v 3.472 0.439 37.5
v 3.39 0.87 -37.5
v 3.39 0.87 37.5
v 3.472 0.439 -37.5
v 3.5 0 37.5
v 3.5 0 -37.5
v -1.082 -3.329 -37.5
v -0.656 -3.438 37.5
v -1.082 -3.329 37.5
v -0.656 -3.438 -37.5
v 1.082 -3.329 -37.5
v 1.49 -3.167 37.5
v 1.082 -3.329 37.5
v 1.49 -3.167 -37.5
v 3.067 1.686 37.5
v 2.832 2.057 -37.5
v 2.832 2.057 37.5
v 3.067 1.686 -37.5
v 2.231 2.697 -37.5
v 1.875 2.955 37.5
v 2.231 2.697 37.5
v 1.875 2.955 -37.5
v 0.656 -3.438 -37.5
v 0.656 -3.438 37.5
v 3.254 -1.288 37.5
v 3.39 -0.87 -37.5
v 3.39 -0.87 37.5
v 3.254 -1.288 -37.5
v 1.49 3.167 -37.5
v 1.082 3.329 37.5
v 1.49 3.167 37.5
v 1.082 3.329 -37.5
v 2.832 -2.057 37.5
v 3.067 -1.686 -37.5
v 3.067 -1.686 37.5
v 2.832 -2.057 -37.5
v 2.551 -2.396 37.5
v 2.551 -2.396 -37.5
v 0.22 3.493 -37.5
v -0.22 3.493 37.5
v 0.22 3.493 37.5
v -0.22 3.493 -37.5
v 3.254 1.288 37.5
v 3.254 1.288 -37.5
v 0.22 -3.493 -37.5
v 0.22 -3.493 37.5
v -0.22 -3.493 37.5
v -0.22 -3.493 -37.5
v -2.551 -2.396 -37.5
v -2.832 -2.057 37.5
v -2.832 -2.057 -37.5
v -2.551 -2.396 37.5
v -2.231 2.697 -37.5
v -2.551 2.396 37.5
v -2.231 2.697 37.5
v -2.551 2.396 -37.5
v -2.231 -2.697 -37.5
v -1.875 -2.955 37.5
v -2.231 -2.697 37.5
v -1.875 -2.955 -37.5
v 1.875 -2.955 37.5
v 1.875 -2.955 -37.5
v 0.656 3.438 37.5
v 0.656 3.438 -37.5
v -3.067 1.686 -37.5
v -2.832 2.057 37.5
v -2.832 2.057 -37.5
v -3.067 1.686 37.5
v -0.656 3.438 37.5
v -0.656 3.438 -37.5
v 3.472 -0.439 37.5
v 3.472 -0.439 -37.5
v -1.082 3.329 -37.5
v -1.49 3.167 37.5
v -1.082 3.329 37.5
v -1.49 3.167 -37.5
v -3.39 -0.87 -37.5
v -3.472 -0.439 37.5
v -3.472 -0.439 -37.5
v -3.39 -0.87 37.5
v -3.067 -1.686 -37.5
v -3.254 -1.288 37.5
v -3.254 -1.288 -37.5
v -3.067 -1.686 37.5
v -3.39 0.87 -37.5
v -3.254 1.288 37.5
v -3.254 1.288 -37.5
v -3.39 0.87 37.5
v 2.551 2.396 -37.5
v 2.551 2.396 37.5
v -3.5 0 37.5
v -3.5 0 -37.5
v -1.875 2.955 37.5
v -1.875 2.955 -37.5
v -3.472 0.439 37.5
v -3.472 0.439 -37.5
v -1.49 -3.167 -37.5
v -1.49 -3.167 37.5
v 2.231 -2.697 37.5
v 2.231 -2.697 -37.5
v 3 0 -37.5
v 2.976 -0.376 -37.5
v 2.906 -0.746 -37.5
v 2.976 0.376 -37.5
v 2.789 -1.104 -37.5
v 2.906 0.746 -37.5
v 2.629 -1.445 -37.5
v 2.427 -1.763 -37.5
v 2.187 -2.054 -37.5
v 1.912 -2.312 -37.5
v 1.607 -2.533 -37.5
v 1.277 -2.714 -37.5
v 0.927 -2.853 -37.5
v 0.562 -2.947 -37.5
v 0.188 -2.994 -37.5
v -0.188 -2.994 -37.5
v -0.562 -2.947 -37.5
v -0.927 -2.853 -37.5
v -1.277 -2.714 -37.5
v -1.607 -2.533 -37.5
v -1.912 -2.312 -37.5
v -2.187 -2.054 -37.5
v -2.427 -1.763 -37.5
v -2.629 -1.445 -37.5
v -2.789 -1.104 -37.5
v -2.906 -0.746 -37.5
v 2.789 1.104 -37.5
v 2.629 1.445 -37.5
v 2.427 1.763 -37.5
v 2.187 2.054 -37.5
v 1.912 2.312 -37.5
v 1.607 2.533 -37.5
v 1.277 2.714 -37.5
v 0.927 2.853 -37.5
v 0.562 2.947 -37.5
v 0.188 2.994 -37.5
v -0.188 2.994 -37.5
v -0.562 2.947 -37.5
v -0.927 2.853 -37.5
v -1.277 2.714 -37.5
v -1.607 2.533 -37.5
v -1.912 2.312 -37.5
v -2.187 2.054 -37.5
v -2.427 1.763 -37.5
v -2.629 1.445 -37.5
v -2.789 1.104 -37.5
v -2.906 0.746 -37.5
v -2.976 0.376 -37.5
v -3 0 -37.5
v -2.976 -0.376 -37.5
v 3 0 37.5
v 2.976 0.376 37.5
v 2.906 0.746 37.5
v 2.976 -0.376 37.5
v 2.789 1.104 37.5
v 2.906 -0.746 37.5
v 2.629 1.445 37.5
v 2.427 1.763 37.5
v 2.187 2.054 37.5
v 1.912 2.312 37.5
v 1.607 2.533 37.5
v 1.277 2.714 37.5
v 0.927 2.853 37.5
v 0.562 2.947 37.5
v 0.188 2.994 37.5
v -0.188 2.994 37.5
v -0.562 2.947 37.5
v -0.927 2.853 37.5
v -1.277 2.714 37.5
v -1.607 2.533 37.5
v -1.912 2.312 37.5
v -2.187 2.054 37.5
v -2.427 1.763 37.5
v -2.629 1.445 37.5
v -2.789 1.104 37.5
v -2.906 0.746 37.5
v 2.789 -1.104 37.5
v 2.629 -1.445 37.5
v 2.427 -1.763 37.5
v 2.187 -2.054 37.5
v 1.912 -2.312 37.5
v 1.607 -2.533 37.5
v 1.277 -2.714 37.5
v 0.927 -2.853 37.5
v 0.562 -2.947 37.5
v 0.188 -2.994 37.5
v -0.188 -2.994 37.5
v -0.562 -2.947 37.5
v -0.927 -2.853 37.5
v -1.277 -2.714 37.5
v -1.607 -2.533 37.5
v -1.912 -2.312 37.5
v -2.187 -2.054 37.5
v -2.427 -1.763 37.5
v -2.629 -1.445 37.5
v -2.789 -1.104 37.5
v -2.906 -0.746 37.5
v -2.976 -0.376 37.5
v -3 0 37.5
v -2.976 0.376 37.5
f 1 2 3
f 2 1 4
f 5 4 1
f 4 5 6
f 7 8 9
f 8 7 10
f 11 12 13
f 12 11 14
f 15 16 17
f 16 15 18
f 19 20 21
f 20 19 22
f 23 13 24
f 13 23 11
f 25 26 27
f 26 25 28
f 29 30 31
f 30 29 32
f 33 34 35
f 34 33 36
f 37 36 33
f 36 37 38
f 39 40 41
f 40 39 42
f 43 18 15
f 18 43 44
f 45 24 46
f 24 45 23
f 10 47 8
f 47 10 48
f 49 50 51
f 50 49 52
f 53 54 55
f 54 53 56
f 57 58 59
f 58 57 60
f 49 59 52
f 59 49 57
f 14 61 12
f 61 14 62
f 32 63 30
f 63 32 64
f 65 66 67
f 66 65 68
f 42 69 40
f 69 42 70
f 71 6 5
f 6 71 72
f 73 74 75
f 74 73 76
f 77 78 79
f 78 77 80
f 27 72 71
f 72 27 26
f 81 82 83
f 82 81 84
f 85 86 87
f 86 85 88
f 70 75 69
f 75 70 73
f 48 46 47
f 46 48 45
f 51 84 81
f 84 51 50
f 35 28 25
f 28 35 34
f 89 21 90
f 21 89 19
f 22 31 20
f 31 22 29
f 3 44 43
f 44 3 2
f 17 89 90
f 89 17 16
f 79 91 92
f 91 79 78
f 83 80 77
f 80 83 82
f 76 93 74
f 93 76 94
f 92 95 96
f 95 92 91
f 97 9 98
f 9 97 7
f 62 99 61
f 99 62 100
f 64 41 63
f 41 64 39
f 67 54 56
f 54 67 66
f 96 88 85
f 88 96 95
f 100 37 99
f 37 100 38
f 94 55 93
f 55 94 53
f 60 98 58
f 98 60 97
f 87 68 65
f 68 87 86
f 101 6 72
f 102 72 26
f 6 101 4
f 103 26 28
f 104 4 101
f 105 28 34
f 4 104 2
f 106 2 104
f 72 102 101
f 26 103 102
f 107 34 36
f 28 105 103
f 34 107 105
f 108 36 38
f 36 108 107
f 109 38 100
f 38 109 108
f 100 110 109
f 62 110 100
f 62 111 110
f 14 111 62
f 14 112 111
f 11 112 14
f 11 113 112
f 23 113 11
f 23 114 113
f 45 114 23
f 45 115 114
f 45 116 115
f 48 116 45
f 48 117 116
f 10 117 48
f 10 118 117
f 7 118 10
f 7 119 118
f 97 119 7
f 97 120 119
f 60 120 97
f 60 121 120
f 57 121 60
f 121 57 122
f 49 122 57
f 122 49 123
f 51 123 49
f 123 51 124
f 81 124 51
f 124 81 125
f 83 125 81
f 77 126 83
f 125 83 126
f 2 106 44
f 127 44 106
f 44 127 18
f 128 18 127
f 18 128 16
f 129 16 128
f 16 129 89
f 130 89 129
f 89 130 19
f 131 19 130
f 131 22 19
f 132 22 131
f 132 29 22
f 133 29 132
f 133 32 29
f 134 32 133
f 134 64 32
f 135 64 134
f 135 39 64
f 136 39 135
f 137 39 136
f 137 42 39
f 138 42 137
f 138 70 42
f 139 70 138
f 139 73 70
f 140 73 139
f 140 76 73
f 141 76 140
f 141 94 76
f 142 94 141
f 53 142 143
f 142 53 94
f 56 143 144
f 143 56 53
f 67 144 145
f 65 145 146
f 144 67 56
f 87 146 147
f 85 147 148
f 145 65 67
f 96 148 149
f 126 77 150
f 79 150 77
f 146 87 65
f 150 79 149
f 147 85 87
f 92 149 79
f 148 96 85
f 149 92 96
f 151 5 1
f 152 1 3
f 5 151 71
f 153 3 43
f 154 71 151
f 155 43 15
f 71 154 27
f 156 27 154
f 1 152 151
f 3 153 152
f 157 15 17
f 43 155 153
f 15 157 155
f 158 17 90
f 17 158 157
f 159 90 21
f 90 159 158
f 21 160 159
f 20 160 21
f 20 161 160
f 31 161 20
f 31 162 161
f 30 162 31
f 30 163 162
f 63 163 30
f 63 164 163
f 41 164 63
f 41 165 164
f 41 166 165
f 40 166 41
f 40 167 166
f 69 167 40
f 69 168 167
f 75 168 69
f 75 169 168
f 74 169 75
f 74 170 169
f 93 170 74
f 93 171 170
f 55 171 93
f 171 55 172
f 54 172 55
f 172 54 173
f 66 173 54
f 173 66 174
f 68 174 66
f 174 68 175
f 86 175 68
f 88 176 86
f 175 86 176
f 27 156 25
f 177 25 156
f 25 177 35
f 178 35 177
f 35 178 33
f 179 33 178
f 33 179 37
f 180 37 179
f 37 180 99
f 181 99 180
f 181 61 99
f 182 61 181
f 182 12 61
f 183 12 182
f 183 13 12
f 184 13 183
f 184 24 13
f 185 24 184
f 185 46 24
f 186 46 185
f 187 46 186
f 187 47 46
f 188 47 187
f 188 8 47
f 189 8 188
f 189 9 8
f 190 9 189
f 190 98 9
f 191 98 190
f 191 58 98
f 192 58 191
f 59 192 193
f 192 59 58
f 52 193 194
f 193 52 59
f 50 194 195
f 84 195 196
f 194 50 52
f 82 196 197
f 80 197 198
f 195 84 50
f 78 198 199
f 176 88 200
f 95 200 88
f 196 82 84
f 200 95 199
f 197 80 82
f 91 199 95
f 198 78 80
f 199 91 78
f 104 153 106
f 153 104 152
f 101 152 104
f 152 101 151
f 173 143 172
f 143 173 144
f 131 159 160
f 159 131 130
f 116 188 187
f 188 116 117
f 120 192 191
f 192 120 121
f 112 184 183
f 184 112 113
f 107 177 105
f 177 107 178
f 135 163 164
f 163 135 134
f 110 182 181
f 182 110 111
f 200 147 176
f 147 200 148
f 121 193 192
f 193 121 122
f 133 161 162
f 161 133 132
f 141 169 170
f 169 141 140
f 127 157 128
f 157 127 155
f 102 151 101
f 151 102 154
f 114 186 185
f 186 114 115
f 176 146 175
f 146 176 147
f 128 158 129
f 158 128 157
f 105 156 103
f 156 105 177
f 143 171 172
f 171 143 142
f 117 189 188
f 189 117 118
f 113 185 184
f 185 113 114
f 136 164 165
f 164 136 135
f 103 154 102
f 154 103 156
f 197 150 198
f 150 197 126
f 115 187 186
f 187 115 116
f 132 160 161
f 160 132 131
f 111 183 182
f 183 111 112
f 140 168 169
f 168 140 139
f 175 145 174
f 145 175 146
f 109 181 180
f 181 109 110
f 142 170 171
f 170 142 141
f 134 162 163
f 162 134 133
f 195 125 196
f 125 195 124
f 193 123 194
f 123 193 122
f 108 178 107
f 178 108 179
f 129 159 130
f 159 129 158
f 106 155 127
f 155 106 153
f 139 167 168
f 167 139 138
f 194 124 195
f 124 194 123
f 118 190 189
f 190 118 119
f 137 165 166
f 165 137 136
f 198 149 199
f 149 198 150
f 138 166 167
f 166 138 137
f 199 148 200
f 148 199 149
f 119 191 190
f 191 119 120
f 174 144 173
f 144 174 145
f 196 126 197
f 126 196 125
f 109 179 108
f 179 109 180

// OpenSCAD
$fn = 50;


difference() {
	union() {
		translate(v = [0, 0, -37.5000000000]) {
			cylinder(h = 75, r = 3.5000000000);
		}
	}
	union() {
		translate(v = [0, 0, -100.0000000000]) {
			cylinder(h = 200, r = 3.0000000000);
		}
	}
}
